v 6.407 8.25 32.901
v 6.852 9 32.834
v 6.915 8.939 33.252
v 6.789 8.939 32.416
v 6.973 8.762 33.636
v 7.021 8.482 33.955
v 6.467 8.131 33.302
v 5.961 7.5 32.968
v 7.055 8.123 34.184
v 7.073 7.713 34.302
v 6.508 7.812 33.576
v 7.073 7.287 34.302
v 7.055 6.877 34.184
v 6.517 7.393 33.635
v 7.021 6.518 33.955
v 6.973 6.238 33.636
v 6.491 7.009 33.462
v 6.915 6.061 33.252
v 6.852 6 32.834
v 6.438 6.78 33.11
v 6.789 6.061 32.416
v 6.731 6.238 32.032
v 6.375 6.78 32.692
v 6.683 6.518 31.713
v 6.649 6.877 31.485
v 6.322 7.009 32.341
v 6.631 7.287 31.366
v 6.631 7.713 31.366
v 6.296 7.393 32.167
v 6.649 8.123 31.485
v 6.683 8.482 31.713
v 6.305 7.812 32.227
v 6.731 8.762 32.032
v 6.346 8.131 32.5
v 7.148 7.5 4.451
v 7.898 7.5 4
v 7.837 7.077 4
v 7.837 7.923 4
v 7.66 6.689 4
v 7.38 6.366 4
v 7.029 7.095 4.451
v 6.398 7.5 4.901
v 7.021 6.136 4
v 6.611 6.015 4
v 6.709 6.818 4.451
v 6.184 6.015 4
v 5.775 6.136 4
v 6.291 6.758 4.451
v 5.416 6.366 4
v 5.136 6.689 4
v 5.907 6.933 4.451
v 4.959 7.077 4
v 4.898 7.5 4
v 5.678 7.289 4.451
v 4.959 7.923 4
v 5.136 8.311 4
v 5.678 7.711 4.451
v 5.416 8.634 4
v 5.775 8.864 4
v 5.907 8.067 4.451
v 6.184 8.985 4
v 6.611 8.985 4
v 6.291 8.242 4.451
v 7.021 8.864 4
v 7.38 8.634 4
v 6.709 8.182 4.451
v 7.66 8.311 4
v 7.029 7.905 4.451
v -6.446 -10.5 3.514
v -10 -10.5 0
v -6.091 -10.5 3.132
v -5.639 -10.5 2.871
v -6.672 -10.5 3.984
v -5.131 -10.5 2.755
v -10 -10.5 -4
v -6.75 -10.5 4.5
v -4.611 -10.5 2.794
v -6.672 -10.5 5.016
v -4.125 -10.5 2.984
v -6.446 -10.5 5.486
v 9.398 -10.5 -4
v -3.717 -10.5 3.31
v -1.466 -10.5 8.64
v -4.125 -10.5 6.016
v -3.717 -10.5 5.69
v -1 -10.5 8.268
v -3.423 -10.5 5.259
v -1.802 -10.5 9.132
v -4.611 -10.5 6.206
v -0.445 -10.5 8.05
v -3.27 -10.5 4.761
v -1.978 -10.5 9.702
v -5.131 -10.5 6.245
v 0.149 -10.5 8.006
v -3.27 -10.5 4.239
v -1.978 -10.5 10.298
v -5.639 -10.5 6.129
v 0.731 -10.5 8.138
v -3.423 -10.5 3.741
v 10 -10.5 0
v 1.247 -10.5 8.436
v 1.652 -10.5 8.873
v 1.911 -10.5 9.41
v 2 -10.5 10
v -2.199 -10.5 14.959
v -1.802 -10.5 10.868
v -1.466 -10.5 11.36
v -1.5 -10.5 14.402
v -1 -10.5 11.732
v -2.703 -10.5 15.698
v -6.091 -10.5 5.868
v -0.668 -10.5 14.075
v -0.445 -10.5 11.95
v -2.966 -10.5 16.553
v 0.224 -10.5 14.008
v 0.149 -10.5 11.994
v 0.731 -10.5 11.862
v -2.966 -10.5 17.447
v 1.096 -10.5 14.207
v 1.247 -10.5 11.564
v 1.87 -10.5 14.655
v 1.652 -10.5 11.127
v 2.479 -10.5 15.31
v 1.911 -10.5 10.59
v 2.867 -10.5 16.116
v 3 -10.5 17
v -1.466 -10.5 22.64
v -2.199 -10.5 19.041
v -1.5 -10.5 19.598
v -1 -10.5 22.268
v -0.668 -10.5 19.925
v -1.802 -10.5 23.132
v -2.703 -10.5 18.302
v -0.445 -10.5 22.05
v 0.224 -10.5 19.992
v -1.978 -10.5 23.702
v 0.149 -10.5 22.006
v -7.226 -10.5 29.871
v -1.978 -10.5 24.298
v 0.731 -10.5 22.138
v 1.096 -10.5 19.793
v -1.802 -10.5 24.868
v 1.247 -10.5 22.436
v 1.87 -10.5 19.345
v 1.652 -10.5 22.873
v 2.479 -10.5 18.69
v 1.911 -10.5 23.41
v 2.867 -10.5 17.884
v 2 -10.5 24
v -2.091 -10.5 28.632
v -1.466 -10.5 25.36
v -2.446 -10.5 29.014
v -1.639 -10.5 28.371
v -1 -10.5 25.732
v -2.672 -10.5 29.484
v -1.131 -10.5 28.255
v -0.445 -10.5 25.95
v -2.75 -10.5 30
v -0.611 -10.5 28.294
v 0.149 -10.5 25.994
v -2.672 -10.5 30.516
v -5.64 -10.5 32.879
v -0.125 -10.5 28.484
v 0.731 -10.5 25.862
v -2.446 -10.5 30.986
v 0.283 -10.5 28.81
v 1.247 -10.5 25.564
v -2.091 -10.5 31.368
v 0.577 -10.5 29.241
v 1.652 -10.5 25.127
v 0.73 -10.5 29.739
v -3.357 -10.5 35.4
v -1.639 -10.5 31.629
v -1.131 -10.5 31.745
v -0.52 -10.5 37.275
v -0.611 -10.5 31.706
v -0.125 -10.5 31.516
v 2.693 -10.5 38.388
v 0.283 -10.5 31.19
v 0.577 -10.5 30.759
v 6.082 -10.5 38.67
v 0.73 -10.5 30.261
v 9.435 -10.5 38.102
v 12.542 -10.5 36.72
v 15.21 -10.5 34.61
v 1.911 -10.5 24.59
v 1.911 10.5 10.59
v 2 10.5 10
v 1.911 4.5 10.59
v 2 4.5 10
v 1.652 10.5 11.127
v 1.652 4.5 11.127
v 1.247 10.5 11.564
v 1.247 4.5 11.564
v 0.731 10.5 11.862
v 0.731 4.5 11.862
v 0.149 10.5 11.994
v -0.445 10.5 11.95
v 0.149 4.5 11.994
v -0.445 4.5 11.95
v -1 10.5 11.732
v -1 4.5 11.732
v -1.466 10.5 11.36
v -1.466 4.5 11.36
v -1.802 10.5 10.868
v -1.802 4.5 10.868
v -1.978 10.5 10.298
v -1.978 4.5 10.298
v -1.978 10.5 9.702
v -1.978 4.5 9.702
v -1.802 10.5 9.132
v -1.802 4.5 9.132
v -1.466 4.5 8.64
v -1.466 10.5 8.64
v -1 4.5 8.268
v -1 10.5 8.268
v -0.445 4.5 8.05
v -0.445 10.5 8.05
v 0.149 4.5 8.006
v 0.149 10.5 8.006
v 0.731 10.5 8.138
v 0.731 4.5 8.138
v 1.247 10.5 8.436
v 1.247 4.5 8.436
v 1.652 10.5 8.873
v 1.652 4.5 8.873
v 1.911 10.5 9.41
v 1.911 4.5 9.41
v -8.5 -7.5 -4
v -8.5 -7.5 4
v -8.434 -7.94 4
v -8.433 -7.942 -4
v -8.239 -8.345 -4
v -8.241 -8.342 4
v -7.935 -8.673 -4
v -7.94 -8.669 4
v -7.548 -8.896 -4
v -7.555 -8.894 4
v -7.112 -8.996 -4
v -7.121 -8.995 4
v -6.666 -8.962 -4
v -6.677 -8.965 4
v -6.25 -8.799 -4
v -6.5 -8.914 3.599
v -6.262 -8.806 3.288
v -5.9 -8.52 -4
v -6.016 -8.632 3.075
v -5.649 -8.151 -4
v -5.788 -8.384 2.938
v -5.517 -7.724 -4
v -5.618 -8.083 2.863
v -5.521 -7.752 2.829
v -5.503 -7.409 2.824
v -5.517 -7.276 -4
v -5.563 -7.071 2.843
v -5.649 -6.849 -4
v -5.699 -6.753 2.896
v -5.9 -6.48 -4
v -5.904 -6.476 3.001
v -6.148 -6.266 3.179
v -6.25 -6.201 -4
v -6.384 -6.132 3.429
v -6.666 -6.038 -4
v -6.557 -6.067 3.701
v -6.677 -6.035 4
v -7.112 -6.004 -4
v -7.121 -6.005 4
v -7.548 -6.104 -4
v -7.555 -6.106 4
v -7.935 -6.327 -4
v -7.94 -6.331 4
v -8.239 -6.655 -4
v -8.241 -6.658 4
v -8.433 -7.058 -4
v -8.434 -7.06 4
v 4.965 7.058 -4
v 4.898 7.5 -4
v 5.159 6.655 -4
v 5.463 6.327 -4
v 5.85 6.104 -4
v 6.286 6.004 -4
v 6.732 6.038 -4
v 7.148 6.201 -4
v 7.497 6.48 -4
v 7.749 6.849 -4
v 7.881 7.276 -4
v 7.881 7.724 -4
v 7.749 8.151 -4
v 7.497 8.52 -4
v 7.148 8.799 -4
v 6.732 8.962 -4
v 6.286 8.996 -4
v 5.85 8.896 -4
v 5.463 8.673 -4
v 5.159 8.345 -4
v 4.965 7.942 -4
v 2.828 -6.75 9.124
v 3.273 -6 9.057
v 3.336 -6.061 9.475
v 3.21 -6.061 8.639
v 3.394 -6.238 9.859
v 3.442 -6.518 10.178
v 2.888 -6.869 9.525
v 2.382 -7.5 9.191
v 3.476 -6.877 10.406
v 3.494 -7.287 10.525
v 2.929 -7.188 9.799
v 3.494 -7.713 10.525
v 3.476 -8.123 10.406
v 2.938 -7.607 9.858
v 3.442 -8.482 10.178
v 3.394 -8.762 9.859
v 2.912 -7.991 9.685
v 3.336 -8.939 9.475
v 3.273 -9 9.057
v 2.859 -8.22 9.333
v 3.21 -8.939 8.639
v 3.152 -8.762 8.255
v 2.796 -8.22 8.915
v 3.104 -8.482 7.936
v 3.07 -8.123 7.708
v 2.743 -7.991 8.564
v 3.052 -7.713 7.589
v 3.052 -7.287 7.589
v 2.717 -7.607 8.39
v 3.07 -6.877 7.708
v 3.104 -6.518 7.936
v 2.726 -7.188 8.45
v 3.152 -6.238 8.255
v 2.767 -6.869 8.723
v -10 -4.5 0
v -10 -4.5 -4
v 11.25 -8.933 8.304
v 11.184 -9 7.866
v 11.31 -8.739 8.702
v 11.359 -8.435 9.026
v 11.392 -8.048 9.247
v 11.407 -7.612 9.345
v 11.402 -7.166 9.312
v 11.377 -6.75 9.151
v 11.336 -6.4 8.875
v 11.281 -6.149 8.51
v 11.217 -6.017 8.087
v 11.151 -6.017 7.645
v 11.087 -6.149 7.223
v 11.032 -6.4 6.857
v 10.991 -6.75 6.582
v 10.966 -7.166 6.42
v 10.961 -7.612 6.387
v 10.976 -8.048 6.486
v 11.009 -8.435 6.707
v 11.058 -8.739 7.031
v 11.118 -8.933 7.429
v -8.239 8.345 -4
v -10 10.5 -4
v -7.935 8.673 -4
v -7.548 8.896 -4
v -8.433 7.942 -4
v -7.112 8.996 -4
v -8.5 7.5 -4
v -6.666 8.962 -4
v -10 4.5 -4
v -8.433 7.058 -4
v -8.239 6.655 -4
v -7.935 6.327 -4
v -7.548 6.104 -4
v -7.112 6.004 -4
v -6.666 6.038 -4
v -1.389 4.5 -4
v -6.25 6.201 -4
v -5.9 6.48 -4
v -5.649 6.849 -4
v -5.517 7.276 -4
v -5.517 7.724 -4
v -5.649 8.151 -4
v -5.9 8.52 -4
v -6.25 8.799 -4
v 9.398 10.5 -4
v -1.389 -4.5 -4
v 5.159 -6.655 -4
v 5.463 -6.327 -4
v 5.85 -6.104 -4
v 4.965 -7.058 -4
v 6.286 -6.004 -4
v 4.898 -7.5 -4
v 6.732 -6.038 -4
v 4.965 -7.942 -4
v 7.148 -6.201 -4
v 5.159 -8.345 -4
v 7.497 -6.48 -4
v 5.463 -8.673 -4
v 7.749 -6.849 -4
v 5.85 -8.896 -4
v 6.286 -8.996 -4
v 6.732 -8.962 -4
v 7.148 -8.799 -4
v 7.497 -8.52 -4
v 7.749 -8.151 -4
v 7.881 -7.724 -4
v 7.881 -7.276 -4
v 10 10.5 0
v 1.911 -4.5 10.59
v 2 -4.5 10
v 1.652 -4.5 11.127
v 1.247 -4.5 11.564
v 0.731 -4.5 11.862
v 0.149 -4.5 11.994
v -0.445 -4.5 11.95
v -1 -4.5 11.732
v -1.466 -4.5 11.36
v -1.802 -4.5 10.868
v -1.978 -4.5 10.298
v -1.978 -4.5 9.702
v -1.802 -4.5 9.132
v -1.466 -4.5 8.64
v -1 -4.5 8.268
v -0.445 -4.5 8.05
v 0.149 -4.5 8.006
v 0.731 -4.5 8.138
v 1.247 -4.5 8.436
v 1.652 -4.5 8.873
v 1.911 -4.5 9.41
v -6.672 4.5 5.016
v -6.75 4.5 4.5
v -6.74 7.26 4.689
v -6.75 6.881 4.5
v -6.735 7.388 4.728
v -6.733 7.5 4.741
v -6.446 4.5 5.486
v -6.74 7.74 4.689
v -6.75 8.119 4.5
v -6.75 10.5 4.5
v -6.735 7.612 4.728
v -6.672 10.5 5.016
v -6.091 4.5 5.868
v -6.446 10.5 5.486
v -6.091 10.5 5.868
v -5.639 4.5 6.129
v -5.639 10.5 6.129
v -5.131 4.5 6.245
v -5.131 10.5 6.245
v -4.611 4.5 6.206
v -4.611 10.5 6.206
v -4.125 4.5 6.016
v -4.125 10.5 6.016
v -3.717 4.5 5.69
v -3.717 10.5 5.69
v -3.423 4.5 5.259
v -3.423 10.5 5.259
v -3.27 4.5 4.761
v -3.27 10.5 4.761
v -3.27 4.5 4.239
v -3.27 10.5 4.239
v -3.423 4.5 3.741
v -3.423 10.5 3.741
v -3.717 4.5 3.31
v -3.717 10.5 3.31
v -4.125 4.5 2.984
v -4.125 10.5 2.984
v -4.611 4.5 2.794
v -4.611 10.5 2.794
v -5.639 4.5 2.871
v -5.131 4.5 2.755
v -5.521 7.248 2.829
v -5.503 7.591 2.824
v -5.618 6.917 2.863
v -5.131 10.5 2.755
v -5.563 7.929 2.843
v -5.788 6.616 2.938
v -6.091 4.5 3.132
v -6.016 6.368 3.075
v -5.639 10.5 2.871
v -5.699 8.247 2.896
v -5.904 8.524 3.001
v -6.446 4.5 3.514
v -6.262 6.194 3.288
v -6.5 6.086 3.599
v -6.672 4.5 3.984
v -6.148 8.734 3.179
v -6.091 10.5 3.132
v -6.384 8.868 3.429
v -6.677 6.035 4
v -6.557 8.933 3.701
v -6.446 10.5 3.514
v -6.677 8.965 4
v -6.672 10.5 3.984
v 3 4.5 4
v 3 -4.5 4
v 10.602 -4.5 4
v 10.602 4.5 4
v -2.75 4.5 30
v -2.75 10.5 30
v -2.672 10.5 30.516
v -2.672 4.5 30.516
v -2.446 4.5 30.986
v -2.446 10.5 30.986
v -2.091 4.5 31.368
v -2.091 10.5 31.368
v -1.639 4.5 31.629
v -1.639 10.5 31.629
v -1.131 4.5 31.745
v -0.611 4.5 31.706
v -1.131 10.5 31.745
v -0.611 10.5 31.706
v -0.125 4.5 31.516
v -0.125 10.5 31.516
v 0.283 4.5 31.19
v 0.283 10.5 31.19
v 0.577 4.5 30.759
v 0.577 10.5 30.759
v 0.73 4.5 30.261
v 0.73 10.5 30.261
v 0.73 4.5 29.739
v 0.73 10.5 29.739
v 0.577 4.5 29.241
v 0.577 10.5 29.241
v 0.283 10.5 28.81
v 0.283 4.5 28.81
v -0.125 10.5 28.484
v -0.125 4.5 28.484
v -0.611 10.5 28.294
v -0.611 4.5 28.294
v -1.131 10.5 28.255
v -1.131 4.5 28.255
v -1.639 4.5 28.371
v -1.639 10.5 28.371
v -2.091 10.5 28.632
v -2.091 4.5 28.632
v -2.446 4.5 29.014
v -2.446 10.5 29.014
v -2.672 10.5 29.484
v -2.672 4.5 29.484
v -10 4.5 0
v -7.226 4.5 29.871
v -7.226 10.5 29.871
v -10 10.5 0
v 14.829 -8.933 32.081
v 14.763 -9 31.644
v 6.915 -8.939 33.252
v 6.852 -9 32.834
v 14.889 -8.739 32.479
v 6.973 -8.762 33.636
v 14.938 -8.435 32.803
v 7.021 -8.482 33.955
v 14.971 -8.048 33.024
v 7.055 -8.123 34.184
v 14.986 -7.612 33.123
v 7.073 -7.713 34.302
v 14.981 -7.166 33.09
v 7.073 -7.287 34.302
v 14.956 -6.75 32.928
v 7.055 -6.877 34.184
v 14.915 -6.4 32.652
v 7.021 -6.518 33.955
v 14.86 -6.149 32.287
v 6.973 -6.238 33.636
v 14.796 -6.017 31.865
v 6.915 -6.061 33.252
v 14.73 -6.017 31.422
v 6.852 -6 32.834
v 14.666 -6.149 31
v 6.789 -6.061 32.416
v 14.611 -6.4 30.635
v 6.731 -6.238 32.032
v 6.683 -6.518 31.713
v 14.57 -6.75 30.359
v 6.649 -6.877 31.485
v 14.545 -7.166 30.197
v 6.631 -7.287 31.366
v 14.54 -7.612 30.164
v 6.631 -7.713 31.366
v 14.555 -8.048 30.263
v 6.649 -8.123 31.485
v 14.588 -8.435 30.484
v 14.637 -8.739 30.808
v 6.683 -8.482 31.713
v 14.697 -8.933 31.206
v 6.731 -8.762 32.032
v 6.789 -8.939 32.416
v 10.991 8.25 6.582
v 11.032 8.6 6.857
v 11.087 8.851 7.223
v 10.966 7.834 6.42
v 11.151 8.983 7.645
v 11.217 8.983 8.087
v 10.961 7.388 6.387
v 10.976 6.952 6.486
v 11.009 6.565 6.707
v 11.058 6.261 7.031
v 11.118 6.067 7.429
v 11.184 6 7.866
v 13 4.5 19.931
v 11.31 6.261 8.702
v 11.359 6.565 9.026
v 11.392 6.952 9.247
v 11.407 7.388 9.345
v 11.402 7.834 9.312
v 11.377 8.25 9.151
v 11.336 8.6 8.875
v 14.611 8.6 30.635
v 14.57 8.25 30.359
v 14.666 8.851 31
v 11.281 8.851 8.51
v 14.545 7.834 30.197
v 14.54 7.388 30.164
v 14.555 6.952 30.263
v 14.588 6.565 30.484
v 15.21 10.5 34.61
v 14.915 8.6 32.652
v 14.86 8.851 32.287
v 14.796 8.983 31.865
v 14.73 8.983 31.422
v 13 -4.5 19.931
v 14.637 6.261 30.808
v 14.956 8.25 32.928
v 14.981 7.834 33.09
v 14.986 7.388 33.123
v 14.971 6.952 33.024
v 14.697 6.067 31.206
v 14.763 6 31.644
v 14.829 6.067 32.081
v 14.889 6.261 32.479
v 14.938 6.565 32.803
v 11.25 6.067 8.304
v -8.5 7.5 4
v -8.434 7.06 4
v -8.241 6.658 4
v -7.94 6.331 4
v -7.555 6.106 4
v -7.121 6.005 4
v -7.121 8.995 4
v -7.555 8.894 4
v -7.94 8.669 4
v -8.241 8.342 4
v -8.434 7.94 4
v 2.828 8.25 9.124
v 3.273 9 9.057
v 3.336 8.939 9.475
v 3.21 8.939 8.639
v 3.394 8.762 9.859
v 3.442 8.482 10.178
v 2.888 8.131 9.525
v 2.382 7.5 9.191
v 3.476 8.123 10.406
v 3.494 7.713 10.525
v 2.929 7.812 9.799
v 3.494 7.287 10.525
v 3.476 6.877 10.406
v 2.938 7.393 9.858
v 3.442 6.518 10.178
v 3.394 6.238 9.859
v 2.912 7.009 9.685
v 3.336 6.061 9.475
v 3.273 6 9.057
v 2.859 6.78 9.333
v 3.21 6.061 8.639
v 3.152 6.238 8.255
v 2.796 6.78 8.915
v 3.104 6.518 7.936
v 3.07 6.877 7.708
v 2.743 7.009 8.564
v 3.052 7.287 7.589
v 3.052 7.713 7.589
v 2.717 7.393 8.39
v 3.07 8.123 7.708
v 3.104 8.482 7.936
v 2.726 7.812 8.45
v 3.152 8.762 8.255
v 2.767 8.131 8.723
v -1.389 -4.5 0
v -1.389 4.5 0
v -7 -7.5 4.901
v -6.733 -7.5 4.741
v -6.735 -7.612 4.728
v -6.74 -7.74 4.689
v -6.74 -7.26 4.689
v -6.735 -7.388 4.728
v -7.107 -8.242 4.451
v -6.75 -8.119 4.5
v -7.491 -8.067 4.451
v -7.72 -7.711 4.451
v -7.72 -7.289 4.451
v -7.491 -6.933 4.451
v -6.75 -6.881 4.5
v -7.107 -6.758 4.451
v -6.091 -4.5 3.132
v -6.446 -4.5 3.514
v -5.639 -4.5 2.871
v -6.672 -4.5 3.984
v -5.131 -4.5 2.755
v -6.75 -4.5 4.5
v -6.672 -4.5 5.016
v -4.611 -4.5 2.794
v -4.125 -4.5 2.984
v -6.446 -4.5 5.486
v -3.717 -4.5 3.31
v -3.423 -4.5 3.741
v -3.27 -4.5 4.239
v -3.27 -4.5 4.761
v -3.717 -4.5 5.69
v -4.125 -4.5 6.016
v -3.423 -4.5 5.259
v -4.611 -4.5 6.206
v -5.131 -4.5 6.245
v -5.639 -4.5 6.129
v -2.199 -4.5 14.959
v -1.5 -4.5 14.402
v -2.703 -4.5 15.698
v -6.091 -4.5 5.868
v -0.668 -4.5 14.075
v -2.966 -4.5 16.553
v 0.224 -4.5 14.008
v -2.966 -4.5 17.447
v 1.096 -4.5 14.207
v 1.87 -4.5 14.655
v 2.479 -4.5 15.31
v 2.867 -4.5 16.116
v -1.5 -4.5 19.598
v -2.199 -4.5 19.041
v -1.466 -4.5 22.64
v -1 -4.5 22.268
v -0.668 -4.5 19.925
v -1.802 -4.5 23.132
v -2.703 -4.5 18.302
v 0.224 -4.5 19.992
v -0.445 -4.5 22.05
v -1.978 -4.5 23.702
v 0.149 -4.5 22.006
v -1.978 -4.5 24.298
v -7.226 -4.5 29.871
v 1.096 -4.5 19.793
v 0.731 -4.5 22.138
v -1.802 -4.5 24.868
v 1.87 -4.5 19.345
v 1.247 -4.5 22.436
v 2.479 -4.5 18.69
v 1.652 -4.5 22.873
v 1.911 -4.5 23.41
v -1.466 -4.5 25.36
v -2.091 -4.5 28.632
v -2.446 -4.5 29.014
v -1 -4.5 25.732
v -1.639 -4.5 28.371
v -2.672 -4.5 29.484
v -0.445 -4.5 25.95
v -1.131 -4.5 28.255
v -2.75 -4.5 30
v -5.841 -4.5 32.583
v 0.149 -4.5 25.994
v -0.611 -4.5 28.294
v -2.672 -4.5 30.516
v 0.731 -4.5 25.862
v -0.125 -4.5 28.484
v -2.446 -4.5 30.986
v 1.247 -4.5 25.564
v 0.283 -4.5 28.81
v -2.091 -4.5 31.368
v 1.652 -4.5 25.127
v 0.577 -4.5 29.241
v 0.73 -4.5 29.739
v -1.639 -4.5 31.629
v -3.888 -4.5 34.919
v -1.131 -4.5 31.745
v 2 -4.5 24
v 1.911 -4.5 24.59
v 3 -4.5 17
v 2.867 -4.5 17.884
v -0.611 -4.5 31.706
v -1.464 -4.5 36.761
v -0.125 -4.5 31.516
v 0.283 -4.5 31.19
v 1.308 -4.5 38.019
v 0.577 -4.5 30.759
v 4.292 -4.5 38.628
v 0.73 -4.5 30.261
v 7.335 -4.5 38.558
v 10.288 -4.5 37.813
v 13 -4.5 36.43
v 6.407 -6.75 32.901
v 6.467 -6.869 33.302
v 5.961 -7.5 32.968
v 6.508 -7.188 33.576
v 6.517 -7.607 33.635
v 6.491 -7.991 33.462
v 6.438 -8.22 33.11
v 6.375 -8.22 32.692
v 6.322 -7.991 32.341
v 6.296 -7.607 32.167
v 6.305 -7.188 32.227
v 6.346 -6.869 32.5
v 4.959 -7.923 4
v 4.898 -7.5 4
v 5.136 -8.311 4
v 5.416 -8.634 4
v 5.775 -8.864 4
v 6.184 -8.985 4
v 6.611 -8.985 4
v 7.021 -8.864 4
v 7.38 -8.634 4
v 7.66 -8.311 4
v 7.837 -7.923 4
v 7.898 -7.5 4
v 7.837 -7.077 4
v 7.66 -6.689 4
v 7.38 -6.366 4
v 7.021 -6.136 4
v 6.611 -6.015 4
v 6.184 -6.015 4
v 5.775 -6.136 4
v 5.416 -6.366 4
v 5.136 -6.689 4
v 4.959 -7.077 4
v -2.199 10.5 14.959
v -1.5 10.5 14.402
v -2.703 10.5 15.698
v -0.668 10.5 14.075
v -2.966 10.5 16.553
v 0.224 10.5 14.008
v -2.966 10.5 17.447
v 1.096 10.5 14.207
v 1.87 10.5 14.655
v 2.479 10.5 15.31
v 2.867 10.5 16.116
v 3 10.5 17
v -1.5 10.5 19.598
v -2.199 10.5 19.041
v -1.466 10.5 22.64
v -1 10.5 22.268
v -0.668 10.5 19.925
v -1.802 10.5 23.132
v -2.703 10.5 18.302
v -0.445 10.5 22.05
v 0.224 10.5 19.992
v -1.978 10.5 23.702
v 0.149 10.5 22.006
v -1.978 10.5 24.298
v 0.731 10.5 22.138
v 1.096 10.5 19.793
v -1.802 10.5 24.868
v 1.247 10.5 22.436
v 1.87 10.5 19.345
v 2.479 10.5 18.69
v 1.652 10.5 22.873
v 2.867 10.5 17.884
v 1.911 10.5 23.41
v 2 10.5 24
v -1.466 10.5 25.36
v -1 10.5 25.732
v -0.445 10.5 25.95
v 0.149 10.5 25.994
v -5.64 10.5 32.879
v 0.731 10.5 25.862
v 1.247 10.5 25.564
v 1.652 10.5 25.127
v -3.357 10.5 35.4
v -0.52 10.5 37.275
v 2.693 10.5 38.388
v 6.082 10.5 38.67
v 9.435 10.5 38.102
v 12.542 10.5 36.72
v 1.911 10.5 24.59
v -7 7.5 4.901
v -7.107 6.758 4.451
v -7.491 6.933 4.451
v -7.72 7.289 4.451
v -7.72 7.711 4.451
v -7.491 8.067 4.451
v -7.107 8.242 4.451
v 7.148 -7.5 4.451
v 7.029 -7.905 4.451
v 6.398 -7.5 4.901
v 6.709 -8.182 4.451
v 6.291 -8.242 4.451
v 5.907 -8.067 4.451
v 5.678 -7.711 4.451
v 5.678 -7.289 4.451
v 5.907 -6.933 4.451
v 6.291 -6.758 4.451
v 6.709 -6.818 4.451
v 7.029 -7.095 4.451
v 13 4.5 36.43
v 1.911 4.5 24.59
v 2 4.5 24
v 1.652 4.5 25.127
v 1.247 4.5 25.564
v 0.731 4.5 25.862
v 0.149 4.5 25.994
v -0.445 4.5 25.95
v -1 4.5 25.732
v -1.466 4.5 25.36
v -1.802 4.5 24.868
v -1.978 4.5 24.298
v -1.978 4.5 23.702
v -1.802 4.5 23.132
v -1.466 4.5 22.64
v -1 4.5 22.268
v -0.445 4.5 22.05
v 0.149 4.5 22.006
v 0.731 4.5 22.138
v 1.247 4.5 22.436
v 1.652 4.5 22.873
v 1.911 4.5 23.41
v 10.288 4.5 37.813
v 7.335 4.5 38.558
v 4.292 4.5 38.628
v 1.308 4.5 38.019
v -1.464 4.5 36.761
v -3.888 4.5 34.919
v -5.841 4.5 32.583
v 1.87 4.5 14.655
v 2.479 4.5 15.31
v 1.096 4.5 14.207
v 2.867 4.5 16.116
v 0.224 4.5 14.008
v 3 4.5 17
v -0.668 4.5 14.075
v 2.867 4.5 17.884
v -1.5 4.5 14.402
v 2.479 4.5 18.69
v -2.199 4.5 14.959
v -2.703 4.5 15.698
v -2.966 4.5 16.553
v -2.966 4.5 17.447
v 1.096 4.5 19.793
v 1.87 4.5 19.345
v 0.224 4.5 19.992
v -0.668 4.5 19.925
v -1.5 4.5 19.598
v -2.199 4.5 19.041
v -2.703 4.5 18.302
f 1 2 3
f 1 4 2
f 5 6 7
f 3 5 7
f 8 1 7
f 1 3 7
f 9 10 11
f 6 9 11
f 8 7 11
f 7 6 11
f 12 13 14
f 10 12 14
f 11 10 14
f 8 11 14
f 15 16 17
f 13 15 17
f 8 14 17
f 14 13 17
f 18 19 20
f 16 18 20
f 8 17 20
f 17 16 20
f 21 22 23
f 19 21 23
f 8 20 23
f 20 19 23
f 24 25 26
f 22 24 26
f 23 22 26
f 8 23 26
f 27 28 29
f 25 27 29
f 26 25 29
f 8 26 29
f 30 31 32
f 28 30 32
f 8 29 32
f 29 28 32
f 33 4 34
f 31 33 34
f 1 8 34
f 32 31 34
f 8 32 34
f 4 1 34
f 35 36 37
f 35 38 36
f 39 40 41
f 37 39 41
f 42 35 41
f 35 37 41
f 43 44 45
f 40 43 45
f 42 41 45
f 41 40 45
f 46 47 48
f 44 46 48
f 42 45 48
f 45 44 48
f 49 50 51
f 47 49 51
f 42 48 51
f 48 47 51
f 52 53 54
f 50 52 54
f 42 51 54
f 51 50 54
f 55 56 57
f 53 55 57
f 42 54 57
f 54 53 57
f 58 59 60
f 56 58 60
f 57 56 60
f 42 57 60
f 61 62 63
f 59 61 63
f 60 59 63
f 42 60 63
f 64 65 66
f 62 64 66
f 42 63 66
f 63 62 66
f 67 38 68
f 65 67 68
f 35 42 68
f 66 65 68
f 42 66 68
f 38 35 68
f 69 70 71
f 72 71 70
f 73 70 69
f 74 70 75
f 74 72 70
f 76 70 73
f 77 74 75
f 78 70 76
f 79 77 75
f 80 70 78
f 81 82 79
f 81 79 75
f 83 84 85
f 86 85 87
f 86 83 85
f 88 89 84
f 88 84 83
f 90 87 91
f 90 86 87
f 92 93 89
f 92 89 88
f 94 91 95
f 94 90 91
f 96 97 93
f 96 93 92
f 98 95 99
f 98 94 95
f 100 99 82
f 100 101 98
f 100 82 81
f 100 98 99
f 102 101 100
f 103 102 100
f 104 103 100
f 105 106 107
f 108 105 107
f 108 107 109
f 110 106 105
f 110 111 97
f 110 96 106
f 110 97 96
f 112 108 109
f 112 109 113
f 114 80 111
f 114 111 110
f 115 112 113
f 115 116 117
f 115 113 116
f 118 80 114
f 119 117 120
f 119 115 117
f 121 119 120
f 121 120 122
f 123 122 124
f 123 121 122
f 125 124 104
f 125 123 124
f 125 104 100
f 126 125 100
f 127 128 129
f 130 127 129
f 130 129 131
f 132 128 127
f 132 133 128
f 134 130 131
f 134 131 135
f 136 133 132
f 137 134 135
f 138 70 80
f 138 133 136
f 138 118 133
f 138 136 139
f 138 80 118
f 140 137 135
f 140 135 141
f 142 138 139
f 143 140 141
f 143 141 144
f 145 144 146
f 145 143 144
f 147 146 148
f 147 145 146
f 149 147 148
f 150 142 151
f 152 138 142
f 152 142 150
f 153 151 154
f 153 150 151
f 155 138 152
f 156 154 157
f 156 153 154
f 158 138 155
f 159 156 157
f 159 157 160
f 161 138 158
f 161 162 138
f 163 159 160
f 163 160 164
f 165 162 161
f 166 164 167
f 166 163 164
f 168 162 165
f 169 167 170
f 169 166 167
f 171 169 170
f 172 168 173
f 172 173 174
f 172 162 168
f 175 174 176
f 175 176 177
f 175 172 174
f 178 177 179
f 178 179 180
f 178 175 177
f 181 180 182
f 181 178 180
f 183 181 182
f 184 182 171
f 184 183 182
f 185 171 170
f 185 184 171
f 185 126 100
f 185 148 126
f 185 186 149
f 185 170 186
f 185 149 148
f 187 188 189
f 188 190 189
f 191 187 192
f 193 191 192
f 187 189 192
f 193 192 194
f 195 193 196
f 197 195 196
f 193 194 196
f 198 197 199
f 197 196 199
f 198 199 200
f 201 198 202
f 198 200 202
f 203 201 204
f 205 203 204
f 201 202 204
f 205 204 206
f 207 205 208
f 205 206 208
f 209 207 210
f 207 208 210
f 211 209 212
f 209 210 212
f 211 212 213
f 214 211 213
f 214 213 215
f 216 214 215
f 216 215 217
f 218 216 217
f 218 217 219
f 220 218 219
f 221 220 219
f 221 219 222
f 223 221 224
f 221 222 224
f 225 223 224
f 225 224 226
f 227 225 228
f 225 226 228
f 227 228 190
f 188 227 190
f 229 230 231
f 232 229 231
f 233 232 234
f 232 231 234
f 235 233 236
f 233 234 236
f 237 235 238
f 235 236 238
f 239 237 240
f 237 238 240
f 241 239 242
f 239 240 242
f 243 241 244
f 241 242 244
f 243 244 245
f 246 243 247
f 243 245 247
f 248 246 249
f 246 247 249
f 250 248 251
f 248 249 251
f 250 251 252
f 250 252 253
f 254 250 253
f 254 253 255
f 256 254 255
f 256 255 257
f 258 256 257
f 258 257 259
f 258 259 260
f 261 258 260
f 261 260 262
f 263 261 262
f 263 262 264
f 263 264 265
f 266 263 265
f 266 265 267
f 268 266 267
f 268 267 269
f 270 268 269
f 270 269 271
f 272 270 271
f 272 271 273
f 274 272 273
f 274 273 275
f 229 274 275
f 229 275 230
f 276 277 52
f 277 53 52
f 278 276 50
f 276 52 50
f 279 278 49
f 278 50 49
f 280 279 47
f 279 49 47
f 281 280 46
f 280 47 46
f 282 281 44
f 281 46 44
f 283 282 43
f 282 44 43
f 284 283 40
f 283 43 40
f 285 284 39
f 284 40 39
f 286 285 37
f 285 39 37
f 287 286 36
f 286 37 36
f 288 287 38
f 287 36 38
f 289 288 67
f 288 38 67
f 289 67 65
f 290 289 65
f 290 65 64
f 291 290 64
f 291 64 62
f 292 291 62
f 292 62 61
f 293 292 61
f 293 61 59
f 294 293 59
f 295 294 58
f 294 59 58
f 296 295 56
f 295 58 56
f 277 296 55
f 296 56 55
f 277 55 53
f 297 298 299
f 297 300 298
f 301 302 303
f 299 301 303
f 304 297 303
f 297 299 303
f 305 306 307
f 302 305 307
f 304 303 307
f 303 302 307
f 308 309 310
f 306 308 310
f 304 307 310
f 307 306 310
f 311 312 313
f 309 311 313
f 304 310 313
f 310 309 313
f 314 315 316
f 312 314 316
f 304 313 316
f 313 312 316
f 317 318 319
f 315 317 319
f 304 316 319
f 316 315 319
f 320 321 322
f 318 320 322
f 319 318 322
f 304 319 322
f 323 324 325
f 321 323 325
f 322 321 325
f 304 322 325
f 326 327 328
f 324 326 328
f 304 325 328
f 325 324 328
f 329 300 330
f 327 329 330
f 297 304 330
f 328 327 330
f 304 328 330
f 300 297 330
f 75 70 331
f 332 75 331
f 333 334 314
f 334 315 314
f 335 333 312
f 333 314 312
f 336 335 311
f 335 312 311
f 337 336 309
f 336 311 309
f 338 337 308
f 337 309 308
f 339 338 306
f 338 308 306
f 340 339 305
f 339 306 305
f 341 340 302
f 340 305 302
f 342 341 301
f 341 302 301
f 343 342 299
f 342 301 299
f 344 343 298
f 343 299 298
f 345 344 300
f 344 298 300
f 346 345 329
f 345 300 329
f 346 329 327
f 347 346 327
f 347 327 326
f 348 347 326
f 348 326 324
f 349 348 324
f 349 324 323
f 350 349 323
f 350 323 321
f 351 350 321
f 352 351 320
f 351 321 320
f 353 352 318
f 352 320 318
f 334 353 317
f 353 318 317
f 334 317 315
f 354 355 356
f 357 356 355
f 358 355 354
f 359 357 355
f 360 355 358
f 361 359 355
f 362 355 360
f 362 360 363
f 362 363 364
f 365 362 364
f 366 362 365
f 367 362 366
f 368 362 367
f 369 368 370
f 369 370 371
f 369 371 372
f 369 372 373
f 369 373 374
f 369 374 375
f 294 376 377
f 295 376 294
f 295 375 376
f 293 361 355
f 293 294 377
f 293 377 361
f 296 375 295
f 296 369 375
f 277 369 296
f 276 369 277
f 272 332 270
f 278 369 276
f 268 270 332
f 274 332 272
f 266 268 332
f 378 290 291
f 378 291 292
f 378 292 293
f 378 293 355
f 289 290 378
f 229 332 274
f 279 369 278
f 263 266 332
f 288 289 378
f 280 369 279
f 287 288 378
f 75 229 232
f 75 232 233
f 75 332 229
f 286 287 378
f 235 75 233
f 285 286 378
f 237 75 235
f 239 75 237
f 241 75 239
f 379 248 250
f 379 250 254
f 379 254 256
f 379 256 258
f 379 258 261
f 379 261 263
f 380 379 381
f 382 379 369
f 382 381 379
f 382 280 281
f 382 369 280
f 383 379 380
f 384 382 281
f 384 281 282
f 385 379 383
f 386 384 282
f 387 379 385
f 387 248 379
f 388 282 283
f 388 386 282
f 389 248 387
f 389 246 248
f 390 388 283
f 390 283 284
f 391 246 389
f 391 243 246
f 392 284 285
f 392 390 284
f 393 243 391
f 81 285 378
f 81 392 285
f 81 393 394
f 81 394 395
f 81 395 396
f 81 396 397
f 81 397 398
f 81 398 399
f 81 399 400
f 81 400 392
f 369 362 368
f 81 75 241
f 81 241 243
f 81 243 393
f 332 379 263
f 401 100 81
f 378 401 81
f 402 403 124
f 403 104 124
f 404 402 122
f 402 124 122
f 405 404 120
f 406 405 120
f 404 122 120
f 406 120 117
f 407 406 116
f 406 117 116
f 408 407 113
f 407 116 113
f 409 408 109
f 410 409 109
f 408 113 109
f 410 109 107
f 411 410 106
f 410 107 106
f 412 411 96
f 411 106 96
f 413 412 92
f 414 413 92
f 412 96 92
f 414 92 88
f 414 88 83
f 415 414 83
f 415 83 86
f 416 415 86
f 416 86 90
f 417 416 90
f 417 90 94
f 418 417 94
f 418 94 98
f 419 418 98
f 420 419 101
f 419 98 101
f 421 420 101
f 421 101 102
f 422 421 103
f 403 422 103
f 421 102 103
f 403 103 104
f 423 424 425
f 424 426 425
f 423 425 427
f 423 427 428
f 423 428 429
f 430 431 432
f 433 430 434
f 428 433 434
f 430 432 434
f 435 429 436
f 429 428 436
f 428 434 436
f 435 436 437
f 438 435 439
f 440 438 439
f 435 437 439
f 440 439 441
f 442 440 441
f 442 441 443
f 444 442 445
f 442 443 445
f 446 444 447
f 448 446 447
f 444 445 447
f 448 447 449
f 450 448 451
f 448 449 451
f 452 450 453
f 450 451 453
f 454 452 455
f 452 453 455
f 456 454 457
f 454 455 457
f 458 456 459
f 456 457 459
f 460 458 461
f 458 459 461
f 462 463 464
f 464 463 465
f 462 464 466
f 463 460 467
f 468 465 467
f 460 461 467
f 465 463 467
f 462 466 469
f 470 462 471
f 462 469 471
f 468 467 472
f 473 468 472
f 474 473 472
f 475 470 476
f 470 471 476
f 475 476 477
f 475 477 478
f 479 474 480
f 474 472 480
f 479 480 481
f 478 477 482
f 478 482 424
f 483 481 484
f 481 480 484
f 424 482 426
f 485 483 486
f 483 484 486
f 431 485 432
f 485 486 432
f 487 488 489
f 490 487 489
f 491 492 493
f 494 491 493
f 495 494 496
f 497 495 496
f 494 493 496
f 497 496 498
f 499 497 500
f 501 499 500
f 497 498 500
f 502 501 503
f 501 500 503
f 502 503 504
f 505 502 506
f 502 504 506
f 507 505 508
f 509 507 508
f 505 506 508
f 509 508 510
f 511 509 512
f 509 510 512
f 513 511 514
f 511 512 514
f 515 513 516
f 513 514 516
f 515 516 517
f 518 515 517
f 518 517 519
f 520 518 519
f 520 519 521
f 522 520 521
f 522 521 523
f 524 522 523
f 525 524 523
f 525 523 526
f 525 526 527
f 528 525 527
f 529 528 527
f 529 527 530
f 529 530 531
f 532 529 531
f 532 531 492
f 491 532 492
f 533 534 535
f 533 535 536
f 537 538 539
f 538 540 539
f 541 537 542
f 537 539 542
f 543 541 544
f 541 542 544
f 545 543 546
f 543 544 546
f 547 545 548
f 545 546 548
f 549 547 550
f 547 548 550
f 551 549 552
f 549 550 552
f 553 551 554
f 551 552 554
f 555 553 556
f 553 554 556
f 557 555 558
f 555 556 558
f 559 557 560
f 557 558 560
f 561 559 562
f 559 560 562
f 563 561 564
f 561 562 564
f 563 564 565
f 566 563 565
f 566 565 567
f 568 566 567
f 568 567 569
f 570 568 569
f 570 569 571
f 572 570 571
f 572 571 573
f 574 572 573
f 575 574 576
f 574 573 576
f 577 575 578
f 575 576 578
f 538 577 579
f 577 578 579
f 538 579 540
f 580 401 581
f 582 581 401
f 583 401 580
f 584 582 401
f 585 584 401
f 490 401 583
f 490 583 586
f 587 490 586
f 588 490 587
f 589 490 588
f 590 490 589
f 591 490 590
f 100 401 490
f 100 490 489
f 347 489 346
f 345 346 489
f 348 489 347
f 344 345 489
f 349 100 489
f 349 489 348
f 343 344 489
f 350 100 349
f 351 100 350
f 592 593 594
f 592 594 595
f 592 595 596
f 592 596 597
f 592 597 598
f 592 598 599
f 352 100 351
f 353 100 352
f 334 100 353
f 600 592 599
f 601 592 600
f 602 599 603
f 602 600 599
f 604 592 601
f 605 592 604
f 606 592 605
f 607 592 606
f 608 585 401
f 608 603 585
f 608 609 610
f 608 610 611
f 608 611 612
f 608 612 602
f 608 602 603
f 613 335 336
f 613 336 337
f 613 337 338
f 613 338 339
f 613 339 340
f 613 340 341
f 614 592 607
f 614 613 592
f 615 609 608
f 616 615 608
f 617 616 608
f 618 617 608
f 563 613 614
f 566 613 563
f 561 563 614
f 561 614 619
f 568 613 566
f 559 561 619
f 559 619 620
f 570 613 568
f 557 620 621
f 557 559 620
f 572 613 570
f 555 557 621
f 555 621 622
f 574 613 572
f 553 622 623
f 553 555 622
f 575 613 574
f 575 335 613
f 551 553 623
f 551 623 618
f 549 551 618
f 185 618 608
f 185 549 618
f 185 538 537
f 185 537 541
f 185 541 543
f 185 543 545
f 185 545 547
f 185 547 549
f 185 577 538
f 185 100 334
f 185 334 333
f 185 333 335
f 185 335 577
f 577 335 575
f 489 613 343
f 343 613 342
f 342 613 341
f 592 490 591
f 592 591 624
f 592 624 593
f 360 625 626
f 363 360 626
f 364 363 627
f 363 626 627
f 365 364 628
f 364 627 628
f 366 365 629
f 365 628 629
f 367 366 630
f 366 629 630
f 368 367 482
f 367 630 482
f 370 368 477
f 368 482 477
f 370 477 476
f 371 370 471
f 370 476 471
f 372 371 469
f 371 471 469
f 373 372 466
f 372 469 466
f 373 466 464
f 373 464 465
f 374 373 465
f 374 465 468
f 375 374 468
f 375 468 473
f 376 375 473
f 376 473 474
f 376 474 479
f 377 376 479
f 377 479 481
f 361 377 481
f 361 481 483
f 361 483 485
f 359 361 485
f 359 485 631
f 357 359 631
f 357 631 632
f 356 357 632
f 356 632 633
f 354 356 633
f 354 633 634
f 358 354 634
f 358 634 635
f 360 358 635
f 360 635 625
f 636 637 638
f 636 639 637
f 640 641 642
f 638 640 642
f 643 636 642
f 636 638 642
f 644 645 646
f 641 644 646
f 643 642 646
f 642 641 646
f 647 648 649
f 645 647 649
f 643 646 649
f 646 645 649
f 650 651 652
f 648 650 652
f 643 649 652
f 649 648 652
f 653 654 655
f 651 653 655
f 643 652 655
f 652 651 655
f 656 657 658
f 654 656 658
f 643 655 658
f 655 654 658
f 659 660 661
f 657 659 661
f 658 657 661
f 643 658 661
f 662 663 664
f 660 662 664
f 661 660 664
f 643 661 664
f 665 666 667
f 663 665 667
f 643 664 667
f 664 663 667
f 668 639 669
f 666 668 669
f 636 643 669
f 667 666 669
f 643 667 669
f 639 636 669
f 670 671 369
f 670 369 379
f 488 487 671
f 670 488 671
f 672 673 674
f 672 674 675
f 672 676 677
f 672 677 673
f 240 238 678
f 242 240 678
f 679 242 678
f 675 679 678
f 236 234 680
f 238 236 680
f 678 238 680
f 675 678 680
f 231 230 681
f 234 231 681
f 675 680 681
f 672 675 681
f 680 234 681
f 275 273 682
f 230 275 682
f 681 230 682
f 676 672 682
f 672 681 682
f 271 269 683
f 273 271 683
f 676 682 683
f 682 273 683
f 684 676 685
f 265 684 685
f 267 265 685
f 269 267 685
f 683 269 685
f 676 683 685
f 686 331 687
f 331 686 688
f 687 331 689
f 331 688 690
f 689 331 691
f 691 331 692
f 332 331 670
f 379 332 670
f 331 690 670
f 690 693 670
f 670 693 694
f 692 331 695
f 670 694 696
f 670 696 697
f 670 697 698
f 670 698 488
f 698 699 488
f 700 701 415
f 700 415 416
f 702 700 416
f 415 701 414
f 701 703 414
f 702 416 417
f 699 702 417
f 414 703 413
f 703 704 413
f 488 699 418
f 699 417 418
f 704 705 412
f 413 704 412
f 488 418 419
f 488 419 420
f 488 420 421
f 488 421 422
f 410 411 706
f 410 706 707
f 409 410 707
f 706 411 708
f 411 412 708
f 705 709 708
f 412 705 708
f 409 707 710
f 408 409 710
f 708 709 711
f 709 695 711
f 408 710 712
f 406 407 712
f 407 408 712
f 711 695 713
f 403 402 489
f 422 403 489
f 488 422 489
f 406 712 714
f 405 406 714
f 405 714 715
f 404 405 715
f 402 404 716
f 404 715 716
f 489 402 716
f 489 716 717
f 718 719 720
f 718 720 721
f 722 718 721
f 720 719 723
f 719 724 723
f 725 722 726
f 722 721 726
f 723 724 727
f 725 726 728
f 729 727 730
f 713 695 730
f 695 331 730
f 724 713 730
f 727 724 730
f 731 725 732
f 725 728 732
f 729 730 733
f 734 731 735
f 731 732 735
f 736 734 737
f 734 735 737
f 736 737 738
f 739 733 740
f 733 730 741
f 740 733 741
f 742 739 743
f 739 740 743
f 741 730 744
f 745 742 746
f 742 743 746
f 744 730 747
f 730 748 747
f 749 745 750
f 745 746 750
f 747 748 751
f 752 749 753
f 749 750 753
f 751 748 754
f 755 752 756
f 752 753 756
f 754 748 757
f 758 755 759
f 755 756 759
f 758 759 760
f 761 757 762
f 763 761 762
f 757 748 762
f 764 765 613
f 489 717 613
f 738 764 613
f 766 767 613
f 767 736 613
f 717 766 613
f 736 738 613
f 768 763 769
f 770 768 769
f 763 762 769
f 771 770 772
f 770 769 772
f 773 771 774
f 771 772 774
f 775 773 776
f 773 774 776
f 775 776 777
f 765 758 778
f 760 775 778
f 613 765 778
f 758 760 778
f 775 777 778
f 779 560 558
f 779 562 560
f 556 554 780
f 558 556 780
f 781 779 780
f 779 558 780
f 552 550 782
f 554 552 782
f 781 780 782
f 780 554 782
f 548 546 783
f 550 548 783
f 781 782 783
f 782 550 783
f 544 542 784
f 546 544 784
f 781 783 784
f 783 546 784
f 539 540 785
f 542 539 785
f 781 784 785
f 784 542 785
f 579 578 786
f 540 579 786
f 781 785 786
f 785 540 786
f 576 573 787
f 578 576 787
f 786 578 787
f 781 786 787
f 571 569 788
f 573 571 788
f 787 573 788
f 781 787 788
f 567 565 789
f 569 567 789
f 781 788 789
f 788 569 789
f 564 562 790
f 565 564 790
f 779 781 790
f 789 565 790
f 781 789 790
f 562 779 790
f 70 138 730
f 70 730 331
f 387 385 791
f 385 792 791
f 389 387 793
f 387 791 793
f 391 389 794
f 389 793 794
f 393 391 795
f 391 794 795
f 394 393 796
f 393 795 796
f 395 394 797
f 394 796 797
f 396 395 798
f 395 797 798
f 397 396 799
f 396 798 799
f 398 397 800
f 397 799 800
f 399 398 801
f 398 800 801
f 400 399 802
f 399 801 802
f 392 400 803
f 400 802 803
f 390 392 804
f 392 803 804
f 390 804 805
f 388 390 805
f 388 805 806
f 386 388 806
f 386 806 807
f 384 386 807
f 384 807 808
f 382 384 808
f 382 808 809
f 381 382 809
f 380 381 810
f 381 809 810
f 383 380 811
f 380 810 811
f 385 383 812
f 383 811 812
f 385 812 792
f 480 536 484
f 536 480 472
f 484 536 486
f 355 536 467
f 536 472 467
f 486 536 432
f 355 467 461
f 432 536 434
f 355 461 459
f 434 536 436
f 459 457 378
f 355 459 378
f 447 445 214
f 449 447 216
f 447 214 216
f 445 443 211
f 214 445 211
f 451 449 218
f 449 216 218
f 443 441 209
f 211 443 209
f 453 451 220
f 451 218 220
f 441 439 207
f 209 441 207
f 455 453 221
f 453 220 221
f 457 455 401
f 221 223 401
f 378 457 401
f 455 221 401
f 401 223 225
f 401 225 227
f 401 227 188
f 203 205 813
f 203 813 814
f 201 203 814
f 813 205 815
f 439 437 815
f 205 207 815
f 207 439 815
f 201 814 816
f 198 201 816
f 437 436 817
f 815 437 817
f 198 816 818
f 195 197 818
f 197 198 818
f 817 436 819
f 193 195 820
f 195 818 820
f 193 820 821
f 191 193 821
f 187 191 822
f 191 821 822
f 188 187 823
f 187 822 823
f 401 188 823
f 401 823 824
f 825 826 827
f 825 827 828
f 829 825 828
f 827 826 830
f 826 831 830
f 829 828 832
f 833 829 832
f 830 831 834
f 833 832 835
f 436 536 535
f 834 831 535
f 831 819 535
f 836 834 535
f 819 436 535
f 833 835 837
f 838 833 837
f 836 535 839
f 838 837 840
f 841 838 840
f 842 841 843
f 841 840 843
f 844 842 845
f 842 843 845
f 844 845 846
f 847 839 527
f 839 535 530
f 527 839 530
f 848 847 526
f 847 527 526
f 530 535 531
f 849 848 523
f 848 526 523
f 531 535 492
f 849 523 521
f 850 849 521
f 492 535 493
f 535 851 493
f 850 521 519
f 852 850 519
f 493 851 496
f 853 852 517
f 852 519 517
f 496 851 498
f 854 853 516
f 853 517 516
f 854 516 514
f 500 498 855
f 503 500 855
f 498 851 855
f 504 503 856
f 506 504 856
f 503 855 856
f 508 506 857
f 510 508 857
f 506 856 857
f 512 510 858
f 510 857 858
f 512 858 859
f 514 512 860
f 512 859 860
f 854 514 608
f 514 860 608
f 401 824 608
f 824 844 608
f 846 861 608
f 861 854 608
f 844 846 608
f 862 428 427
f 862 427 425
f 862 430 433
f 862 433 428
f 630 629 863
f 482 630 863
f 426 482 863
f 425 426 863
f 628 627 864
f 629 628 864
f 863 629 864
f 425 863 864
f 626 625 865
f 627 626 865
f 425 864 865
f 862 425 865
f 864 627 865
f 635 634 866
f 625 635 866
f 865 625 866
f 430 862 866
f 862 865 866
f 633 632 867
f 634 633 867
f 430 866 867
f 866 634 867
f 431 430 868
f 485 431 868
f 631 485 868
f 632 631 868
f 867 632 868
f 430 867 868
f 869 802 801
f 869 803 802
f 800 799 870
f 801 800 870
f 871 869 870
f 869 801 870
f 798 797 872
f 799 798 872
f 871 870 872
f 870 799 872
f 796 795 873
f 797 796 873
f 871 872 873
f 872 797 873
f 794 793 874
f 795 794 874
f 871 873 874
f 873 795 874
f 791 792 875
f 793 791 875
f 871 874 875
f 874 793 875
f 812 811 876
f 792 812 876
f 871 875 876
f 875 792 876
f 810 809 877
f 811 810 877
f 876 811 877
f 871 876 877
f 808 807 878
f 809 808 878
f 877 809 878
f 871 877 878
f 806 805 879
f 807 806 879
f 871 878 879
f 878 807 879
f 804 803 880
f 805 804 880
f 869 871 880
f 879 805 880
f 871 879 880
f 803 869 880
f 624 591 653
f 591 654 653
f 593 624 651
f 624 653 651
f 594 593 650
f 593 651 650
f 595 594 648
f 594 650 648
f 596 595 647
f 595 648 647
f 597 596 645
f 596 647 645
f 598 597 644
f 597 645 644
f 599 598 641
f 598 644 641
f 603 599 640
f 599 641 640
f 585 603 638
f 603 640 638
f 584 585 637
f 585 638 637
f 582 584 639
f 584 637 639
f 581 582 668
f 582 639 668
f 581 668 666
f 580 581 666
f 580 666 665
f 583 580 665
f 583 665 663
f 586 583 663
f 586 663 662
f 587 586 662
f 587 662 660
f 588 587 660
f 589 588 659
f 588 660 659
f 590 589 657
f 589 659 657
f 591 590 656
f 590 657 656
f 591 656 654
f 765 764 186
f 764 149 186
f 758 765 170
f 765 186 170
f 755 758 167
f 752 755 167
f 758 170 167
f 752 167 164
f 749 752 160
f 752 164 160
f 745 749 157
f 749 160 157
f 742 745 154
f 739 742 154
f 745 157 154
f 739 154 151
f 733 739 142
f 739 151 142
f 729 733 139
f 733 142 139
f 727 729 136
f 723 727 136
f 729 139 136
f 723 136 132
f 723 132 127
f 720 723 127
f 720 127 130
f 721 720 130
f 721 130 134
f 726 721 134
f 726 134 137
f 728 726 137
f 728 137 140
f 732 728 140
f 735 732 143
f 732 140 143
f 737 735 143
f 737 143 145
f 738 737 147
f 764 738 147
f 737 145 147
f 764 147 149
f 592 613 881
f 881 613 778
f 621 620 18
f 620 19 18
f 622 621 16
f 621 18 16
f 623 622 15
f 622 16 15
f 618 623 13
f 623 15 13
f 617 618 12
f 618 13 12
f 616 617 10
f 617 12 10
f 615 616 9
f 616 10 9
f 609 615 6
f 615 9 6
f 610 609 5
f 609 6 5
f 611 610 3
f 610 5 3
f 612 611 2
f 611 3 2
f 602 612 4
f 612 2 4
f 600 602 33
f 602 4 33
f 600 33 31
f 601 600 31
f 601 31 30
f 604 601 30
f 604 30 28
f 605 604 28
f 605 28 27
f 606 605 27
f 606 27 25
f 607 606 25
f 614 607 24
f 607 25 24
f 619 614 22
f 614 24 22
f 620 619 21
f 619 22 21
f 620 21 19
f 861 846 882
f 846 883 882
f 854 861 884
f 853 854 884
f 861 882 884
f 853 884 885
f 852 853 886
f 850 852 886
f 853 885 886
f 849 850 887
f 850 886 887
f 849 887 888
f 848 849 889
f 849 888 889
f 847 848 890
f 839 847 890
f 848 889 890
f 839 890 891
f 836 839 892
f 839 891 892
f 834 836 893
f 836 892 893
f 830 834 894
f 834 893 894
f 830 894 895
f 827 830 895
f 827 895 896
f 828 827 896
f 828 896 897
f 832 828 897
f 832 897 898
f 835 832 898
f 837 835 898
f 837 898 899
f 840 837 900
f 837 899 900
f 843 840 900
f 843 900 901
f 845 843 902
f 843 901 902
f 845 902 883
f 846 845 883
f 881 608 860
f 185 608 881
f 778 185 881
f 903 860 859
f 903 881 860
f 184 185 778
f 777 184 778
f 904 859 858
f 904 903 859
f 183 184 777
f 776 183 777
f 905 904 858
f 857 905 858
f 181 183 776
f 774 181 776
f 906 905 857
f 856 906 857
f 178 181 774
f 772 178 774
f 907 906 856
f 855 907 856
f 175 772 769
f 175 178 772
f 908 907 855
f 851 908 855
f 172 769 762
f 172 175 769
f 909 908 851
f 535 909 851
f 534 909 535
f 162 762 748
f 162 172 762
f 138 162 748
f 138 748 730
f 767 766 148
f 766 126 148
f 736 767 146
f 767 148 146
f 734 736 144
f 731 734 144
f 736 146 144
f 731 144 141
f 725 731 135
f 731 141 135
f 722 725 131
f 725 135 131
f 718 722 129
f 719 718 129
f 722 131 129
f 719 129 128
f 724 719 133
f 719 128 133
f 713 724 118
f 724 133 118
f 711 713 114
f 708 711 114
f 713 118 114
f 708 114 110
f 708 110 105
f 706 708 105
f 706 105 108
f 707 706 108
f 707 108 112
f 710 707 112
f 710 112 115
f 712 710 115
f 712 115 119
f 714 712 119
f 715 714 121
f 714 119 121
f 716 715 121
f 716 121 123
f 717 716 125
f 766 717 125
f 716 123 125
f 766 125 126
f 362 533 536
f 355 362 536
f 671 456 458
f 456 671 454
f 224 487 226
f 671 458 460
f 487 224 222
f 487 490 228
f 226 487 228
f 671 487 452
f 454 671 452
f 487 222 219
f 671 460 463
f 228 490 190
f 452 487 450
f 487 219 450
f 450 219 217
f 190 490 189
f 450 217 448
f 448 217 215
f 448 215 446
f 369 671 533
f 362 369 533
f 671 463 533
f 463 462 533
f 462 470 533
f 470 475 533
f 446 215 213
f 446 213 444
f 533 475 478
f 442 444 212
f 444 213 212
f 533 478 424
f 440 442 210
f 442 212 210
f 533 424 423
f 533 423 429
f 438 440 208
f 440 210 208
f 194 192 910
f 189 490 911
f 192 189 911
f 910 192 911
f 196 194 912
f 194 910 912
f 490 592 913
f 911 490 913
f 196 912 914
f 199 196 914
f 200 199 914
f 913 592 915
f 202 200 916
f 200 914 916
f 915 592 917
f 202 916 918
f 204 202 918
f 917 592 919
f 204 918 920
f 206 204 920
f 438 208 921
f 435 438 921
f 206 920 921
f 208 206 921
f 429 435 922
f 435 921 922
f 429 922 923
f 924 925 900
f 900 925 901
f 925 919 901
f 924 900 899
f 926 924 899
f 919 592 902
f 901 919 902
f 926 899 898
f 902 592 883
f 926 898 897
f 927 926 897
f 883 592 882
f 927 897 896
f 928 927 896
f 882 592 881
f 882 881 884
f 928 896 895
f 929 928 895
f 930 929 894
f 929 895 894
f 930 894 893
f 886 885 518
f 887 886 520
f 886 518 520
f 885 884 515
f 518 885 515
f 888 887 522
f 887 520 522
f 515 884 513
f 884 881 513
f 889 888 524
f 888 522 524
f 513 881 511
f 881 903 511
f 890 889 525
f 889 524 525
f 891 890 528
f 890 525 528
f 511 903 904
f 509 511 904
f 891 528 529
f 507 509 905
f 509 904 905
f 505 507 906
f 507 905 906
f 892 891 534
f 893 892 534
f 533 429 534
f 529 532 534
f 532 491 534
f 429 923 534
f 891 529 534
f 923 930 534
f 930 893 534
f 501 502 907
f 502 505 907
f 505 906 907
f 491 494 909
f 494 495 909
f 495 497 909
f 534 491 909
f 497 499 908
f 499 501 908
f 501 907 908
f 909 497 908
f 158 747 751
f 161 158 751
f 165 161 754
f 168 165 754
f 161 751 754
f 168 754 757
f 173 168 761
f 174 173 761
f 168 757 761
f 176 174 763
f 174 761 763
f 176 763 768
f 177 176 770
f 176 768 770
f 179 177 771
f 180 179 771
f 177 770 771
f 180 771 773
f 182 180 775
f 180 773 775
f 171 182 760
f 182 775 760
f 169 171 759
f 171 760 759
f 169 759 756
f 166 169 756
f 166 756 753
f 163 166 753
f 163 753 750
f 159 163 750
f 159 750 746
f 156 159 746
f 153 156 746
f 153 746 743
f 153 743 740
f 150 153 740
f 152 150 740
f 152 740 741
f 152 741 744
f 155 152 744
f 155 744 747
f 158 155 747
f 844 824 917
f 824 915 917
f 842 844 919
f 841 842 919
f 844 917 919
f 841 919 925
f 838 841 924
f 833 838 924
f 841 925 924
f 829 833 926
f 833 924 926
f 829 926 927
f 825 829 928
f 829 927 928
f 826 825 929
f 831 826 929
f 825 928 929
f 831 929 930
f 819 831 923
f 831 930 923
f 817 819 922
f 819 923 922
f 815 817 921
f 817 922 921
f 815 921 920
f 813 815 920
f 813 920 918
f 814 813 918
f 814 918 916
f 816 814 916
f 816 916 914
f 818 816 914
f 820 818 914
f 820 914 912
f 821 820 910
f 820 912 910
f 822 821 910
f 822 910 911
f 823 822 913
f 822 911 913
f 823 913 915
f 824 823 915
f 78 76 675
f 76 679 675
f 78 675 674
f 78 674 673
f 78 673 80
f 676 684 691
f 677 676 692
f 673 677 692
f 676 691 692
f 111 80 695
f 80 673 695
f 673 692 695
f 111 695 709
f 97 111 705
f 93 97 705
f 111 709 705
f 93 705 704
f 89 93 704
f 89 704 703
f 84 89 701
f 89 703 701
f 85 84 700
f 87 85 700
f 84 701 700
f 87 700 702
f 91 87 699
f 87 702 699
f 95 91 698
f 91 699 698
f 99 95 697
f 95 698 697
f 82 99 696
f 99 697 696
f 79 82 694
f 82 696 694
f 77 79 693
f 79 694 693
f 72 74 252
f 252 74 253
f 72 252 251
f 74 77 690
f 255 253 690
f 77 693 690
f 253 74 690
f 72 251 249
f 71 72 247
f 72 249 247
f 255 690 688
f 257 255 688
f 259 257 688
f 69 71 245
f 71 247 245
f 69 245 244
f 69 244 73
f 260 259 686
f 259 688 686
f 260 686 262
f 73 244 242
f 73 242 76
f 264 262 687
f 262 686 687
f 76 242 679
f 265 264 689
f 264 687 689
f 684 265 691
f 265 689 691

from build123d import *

# Parameters (mm, degrees)
F1_DEPTH    = 10.5
F3_DEPTH    = 4.5
F6_D        = 3.5
F7_T1_DEPTH = 9
F8_R        = 2
F9_DEPTH    = 12.5
F8_R_2      = 3
F11_DEPTH   = 4
F13_DEPTH   = 20
F16_D       = 3
F16_DEPTH   = 8
F16_TIP     = 0.9012909285
F18_D       = 3
F18_DEPTH   = 8
F18_TIP     = 0.9012909285


# Not quite as in the source:
# - a fillet or chamfer that OpenCascade refuses, or shapes differently, is made with other operations: its cross-section is extruded or revolved along the edge and cut away or added


with BuildPart() as f1:
    # F0 (on Front) → F1 (new body, symmetric)
    with BuildSketch(Plane.XZ):
        with BuildLine():
            Line((-10, 0), (10, 0))
            Line((10, 0), (15.209575871, 34.6101187407))
            ThreePointArc((15.209575871, 34.6101187407), (2.6933109979, 38.3883800382), (-7.2260939759, 29.8714821422))
            Line((-7.2260939759, 29.8714821422), (-10, 0))
        make_face()
    extrude(amount=F1_DEPTH, both=True)


with BuildPart() as f3:
    # F2 (on Front) → F3 (new body, symmetric)
    with BuildSketch(Plane.XZ):
        Polygon((-2, 4), (13, 4), (13, 39), (-15, 39), (-15, 0), (-2.371445382, 0), align=None)
    extrude(amount=F3_DEPTH, both=True)


with BuildPart() as f1_1:
    add(f1.part)

    # F4: cut F3
    add(f3.part, mode=Mode.SUBTRACT)

    # F6 (through all)
    with Locations(Plane.XZ.offset(10.5)):
        with Locations((-1, 30), (-5, 4.5)):
            Hole(F6_D / 2)

    # F7: chamfer of 5 on 1 edges, made by hand

    # F7_s2 → F7_t1 (cut)
    with BuildSketch(Plane.XZ.offset(-4.5)):
        Polygon((3, 4), (-2.4623176707, -0.978580357), (-2, 4), align=None)
    extrude(amount=F7_T1_DEPTH, mode=Mode.SUBTRACT)


with BuildPart() as f9:
    # F8 (on Front) → F9 (new body, symmetric)
    with BuildSketch(Plane.XZ):
        with Locations((0, 24)):
            Circle(F8_R)
    extrude(amount=F9_DEPTH, both=True)


with BuildPart() as f9b:
    # F8 (on Front) → F9, piece 2 (new body, symmetric)
    with BuildSketch(Plane.XZ):
        with Locations((0, 17)):
            Circle(F8_R_2)
    extrude(amount=F9_DEPTH, both=True)


with BuildPart() as f9c:
    # F8 (on Front) → F9, piece 3 (new body, symmetric)
    with BuildSketch(Plane.XZ):
        with Locations((0, 10)):
            Circle(F8_R)
    extrude(amount=F9_DEPTH, both=True)


with BuildPart() as f1_2:
    add(f1_1.part)

    # F10: cut F9c, F9b, F9
    add(f9c.part, mode=Mode.SUBTRACT)
    add(f9b.part, mode=Mode.SUBTRACT)
    add(f9.part, mode=Mode.SUBTRACT)

    # F11 (add): a face of the model
    f11_faces = [f1_2.faces().sort_by_distance(p)[0] for p in [
        (1.2885403927, 0, 0),
    ]]
    extrude(f11_faces, amount=F11_DEPTH)


with BuildPart() as f13:
    # F12 (on Front) → F13 (new body, symmetric)
    with BuildSketch(Plane.XZ):
        Polygon((10, -10), (10, 0), (8.4947824334, -10), align=None)
    extrude(amount=F13_DEPTH, both=True)


with BuildPart() as f1_3:
    add(f1_2.part)

    # F14: cut F13
    add(f13.part, mode=Mode.SUBTRACT)

    # F16
    with Locations(Plane(origin=(0, 0, -4), x_dir=(1, 0, 0), z_dir=(0, 0, -1))):
        with Locations((-7, 7.5), (6.3979129734, 7.5), (6.3979129734, -7.5), (-7, -7.5)):
            Hole(F16_D / 2, depth=F16_DEPTH)
            with Locations((0, 0, -(F16_DEPTH + F16_TIP / 2))):  # 118° drill point
                Cone(0, F16_D / 2, F16_TIP, mode=Mode.SUBTRACT)

    # F18
    with Locations(Plane(origin=(9.7784515857, 0, -1.4718697101), x_dir=(0, 1, 0), z_dir=(0.9888605354, 0, -0.1488450249))):
        with Locations((-7.5, 33.4884502488), (7.5, 33.4884502488), (-7.5, 9.4433904486), (7.5, 9.4433904486)):
            Hole(F18_D / 2, depth=F18_DEPTH)
            with Locations((0, 0, -(F18_DEPTH + F18_TIP / 2))):  # 118° drill point
                Cone(0, F18_D / 2, F18_TIP, mode=Mode.SUBTRACT)


solid = f1_3.part
